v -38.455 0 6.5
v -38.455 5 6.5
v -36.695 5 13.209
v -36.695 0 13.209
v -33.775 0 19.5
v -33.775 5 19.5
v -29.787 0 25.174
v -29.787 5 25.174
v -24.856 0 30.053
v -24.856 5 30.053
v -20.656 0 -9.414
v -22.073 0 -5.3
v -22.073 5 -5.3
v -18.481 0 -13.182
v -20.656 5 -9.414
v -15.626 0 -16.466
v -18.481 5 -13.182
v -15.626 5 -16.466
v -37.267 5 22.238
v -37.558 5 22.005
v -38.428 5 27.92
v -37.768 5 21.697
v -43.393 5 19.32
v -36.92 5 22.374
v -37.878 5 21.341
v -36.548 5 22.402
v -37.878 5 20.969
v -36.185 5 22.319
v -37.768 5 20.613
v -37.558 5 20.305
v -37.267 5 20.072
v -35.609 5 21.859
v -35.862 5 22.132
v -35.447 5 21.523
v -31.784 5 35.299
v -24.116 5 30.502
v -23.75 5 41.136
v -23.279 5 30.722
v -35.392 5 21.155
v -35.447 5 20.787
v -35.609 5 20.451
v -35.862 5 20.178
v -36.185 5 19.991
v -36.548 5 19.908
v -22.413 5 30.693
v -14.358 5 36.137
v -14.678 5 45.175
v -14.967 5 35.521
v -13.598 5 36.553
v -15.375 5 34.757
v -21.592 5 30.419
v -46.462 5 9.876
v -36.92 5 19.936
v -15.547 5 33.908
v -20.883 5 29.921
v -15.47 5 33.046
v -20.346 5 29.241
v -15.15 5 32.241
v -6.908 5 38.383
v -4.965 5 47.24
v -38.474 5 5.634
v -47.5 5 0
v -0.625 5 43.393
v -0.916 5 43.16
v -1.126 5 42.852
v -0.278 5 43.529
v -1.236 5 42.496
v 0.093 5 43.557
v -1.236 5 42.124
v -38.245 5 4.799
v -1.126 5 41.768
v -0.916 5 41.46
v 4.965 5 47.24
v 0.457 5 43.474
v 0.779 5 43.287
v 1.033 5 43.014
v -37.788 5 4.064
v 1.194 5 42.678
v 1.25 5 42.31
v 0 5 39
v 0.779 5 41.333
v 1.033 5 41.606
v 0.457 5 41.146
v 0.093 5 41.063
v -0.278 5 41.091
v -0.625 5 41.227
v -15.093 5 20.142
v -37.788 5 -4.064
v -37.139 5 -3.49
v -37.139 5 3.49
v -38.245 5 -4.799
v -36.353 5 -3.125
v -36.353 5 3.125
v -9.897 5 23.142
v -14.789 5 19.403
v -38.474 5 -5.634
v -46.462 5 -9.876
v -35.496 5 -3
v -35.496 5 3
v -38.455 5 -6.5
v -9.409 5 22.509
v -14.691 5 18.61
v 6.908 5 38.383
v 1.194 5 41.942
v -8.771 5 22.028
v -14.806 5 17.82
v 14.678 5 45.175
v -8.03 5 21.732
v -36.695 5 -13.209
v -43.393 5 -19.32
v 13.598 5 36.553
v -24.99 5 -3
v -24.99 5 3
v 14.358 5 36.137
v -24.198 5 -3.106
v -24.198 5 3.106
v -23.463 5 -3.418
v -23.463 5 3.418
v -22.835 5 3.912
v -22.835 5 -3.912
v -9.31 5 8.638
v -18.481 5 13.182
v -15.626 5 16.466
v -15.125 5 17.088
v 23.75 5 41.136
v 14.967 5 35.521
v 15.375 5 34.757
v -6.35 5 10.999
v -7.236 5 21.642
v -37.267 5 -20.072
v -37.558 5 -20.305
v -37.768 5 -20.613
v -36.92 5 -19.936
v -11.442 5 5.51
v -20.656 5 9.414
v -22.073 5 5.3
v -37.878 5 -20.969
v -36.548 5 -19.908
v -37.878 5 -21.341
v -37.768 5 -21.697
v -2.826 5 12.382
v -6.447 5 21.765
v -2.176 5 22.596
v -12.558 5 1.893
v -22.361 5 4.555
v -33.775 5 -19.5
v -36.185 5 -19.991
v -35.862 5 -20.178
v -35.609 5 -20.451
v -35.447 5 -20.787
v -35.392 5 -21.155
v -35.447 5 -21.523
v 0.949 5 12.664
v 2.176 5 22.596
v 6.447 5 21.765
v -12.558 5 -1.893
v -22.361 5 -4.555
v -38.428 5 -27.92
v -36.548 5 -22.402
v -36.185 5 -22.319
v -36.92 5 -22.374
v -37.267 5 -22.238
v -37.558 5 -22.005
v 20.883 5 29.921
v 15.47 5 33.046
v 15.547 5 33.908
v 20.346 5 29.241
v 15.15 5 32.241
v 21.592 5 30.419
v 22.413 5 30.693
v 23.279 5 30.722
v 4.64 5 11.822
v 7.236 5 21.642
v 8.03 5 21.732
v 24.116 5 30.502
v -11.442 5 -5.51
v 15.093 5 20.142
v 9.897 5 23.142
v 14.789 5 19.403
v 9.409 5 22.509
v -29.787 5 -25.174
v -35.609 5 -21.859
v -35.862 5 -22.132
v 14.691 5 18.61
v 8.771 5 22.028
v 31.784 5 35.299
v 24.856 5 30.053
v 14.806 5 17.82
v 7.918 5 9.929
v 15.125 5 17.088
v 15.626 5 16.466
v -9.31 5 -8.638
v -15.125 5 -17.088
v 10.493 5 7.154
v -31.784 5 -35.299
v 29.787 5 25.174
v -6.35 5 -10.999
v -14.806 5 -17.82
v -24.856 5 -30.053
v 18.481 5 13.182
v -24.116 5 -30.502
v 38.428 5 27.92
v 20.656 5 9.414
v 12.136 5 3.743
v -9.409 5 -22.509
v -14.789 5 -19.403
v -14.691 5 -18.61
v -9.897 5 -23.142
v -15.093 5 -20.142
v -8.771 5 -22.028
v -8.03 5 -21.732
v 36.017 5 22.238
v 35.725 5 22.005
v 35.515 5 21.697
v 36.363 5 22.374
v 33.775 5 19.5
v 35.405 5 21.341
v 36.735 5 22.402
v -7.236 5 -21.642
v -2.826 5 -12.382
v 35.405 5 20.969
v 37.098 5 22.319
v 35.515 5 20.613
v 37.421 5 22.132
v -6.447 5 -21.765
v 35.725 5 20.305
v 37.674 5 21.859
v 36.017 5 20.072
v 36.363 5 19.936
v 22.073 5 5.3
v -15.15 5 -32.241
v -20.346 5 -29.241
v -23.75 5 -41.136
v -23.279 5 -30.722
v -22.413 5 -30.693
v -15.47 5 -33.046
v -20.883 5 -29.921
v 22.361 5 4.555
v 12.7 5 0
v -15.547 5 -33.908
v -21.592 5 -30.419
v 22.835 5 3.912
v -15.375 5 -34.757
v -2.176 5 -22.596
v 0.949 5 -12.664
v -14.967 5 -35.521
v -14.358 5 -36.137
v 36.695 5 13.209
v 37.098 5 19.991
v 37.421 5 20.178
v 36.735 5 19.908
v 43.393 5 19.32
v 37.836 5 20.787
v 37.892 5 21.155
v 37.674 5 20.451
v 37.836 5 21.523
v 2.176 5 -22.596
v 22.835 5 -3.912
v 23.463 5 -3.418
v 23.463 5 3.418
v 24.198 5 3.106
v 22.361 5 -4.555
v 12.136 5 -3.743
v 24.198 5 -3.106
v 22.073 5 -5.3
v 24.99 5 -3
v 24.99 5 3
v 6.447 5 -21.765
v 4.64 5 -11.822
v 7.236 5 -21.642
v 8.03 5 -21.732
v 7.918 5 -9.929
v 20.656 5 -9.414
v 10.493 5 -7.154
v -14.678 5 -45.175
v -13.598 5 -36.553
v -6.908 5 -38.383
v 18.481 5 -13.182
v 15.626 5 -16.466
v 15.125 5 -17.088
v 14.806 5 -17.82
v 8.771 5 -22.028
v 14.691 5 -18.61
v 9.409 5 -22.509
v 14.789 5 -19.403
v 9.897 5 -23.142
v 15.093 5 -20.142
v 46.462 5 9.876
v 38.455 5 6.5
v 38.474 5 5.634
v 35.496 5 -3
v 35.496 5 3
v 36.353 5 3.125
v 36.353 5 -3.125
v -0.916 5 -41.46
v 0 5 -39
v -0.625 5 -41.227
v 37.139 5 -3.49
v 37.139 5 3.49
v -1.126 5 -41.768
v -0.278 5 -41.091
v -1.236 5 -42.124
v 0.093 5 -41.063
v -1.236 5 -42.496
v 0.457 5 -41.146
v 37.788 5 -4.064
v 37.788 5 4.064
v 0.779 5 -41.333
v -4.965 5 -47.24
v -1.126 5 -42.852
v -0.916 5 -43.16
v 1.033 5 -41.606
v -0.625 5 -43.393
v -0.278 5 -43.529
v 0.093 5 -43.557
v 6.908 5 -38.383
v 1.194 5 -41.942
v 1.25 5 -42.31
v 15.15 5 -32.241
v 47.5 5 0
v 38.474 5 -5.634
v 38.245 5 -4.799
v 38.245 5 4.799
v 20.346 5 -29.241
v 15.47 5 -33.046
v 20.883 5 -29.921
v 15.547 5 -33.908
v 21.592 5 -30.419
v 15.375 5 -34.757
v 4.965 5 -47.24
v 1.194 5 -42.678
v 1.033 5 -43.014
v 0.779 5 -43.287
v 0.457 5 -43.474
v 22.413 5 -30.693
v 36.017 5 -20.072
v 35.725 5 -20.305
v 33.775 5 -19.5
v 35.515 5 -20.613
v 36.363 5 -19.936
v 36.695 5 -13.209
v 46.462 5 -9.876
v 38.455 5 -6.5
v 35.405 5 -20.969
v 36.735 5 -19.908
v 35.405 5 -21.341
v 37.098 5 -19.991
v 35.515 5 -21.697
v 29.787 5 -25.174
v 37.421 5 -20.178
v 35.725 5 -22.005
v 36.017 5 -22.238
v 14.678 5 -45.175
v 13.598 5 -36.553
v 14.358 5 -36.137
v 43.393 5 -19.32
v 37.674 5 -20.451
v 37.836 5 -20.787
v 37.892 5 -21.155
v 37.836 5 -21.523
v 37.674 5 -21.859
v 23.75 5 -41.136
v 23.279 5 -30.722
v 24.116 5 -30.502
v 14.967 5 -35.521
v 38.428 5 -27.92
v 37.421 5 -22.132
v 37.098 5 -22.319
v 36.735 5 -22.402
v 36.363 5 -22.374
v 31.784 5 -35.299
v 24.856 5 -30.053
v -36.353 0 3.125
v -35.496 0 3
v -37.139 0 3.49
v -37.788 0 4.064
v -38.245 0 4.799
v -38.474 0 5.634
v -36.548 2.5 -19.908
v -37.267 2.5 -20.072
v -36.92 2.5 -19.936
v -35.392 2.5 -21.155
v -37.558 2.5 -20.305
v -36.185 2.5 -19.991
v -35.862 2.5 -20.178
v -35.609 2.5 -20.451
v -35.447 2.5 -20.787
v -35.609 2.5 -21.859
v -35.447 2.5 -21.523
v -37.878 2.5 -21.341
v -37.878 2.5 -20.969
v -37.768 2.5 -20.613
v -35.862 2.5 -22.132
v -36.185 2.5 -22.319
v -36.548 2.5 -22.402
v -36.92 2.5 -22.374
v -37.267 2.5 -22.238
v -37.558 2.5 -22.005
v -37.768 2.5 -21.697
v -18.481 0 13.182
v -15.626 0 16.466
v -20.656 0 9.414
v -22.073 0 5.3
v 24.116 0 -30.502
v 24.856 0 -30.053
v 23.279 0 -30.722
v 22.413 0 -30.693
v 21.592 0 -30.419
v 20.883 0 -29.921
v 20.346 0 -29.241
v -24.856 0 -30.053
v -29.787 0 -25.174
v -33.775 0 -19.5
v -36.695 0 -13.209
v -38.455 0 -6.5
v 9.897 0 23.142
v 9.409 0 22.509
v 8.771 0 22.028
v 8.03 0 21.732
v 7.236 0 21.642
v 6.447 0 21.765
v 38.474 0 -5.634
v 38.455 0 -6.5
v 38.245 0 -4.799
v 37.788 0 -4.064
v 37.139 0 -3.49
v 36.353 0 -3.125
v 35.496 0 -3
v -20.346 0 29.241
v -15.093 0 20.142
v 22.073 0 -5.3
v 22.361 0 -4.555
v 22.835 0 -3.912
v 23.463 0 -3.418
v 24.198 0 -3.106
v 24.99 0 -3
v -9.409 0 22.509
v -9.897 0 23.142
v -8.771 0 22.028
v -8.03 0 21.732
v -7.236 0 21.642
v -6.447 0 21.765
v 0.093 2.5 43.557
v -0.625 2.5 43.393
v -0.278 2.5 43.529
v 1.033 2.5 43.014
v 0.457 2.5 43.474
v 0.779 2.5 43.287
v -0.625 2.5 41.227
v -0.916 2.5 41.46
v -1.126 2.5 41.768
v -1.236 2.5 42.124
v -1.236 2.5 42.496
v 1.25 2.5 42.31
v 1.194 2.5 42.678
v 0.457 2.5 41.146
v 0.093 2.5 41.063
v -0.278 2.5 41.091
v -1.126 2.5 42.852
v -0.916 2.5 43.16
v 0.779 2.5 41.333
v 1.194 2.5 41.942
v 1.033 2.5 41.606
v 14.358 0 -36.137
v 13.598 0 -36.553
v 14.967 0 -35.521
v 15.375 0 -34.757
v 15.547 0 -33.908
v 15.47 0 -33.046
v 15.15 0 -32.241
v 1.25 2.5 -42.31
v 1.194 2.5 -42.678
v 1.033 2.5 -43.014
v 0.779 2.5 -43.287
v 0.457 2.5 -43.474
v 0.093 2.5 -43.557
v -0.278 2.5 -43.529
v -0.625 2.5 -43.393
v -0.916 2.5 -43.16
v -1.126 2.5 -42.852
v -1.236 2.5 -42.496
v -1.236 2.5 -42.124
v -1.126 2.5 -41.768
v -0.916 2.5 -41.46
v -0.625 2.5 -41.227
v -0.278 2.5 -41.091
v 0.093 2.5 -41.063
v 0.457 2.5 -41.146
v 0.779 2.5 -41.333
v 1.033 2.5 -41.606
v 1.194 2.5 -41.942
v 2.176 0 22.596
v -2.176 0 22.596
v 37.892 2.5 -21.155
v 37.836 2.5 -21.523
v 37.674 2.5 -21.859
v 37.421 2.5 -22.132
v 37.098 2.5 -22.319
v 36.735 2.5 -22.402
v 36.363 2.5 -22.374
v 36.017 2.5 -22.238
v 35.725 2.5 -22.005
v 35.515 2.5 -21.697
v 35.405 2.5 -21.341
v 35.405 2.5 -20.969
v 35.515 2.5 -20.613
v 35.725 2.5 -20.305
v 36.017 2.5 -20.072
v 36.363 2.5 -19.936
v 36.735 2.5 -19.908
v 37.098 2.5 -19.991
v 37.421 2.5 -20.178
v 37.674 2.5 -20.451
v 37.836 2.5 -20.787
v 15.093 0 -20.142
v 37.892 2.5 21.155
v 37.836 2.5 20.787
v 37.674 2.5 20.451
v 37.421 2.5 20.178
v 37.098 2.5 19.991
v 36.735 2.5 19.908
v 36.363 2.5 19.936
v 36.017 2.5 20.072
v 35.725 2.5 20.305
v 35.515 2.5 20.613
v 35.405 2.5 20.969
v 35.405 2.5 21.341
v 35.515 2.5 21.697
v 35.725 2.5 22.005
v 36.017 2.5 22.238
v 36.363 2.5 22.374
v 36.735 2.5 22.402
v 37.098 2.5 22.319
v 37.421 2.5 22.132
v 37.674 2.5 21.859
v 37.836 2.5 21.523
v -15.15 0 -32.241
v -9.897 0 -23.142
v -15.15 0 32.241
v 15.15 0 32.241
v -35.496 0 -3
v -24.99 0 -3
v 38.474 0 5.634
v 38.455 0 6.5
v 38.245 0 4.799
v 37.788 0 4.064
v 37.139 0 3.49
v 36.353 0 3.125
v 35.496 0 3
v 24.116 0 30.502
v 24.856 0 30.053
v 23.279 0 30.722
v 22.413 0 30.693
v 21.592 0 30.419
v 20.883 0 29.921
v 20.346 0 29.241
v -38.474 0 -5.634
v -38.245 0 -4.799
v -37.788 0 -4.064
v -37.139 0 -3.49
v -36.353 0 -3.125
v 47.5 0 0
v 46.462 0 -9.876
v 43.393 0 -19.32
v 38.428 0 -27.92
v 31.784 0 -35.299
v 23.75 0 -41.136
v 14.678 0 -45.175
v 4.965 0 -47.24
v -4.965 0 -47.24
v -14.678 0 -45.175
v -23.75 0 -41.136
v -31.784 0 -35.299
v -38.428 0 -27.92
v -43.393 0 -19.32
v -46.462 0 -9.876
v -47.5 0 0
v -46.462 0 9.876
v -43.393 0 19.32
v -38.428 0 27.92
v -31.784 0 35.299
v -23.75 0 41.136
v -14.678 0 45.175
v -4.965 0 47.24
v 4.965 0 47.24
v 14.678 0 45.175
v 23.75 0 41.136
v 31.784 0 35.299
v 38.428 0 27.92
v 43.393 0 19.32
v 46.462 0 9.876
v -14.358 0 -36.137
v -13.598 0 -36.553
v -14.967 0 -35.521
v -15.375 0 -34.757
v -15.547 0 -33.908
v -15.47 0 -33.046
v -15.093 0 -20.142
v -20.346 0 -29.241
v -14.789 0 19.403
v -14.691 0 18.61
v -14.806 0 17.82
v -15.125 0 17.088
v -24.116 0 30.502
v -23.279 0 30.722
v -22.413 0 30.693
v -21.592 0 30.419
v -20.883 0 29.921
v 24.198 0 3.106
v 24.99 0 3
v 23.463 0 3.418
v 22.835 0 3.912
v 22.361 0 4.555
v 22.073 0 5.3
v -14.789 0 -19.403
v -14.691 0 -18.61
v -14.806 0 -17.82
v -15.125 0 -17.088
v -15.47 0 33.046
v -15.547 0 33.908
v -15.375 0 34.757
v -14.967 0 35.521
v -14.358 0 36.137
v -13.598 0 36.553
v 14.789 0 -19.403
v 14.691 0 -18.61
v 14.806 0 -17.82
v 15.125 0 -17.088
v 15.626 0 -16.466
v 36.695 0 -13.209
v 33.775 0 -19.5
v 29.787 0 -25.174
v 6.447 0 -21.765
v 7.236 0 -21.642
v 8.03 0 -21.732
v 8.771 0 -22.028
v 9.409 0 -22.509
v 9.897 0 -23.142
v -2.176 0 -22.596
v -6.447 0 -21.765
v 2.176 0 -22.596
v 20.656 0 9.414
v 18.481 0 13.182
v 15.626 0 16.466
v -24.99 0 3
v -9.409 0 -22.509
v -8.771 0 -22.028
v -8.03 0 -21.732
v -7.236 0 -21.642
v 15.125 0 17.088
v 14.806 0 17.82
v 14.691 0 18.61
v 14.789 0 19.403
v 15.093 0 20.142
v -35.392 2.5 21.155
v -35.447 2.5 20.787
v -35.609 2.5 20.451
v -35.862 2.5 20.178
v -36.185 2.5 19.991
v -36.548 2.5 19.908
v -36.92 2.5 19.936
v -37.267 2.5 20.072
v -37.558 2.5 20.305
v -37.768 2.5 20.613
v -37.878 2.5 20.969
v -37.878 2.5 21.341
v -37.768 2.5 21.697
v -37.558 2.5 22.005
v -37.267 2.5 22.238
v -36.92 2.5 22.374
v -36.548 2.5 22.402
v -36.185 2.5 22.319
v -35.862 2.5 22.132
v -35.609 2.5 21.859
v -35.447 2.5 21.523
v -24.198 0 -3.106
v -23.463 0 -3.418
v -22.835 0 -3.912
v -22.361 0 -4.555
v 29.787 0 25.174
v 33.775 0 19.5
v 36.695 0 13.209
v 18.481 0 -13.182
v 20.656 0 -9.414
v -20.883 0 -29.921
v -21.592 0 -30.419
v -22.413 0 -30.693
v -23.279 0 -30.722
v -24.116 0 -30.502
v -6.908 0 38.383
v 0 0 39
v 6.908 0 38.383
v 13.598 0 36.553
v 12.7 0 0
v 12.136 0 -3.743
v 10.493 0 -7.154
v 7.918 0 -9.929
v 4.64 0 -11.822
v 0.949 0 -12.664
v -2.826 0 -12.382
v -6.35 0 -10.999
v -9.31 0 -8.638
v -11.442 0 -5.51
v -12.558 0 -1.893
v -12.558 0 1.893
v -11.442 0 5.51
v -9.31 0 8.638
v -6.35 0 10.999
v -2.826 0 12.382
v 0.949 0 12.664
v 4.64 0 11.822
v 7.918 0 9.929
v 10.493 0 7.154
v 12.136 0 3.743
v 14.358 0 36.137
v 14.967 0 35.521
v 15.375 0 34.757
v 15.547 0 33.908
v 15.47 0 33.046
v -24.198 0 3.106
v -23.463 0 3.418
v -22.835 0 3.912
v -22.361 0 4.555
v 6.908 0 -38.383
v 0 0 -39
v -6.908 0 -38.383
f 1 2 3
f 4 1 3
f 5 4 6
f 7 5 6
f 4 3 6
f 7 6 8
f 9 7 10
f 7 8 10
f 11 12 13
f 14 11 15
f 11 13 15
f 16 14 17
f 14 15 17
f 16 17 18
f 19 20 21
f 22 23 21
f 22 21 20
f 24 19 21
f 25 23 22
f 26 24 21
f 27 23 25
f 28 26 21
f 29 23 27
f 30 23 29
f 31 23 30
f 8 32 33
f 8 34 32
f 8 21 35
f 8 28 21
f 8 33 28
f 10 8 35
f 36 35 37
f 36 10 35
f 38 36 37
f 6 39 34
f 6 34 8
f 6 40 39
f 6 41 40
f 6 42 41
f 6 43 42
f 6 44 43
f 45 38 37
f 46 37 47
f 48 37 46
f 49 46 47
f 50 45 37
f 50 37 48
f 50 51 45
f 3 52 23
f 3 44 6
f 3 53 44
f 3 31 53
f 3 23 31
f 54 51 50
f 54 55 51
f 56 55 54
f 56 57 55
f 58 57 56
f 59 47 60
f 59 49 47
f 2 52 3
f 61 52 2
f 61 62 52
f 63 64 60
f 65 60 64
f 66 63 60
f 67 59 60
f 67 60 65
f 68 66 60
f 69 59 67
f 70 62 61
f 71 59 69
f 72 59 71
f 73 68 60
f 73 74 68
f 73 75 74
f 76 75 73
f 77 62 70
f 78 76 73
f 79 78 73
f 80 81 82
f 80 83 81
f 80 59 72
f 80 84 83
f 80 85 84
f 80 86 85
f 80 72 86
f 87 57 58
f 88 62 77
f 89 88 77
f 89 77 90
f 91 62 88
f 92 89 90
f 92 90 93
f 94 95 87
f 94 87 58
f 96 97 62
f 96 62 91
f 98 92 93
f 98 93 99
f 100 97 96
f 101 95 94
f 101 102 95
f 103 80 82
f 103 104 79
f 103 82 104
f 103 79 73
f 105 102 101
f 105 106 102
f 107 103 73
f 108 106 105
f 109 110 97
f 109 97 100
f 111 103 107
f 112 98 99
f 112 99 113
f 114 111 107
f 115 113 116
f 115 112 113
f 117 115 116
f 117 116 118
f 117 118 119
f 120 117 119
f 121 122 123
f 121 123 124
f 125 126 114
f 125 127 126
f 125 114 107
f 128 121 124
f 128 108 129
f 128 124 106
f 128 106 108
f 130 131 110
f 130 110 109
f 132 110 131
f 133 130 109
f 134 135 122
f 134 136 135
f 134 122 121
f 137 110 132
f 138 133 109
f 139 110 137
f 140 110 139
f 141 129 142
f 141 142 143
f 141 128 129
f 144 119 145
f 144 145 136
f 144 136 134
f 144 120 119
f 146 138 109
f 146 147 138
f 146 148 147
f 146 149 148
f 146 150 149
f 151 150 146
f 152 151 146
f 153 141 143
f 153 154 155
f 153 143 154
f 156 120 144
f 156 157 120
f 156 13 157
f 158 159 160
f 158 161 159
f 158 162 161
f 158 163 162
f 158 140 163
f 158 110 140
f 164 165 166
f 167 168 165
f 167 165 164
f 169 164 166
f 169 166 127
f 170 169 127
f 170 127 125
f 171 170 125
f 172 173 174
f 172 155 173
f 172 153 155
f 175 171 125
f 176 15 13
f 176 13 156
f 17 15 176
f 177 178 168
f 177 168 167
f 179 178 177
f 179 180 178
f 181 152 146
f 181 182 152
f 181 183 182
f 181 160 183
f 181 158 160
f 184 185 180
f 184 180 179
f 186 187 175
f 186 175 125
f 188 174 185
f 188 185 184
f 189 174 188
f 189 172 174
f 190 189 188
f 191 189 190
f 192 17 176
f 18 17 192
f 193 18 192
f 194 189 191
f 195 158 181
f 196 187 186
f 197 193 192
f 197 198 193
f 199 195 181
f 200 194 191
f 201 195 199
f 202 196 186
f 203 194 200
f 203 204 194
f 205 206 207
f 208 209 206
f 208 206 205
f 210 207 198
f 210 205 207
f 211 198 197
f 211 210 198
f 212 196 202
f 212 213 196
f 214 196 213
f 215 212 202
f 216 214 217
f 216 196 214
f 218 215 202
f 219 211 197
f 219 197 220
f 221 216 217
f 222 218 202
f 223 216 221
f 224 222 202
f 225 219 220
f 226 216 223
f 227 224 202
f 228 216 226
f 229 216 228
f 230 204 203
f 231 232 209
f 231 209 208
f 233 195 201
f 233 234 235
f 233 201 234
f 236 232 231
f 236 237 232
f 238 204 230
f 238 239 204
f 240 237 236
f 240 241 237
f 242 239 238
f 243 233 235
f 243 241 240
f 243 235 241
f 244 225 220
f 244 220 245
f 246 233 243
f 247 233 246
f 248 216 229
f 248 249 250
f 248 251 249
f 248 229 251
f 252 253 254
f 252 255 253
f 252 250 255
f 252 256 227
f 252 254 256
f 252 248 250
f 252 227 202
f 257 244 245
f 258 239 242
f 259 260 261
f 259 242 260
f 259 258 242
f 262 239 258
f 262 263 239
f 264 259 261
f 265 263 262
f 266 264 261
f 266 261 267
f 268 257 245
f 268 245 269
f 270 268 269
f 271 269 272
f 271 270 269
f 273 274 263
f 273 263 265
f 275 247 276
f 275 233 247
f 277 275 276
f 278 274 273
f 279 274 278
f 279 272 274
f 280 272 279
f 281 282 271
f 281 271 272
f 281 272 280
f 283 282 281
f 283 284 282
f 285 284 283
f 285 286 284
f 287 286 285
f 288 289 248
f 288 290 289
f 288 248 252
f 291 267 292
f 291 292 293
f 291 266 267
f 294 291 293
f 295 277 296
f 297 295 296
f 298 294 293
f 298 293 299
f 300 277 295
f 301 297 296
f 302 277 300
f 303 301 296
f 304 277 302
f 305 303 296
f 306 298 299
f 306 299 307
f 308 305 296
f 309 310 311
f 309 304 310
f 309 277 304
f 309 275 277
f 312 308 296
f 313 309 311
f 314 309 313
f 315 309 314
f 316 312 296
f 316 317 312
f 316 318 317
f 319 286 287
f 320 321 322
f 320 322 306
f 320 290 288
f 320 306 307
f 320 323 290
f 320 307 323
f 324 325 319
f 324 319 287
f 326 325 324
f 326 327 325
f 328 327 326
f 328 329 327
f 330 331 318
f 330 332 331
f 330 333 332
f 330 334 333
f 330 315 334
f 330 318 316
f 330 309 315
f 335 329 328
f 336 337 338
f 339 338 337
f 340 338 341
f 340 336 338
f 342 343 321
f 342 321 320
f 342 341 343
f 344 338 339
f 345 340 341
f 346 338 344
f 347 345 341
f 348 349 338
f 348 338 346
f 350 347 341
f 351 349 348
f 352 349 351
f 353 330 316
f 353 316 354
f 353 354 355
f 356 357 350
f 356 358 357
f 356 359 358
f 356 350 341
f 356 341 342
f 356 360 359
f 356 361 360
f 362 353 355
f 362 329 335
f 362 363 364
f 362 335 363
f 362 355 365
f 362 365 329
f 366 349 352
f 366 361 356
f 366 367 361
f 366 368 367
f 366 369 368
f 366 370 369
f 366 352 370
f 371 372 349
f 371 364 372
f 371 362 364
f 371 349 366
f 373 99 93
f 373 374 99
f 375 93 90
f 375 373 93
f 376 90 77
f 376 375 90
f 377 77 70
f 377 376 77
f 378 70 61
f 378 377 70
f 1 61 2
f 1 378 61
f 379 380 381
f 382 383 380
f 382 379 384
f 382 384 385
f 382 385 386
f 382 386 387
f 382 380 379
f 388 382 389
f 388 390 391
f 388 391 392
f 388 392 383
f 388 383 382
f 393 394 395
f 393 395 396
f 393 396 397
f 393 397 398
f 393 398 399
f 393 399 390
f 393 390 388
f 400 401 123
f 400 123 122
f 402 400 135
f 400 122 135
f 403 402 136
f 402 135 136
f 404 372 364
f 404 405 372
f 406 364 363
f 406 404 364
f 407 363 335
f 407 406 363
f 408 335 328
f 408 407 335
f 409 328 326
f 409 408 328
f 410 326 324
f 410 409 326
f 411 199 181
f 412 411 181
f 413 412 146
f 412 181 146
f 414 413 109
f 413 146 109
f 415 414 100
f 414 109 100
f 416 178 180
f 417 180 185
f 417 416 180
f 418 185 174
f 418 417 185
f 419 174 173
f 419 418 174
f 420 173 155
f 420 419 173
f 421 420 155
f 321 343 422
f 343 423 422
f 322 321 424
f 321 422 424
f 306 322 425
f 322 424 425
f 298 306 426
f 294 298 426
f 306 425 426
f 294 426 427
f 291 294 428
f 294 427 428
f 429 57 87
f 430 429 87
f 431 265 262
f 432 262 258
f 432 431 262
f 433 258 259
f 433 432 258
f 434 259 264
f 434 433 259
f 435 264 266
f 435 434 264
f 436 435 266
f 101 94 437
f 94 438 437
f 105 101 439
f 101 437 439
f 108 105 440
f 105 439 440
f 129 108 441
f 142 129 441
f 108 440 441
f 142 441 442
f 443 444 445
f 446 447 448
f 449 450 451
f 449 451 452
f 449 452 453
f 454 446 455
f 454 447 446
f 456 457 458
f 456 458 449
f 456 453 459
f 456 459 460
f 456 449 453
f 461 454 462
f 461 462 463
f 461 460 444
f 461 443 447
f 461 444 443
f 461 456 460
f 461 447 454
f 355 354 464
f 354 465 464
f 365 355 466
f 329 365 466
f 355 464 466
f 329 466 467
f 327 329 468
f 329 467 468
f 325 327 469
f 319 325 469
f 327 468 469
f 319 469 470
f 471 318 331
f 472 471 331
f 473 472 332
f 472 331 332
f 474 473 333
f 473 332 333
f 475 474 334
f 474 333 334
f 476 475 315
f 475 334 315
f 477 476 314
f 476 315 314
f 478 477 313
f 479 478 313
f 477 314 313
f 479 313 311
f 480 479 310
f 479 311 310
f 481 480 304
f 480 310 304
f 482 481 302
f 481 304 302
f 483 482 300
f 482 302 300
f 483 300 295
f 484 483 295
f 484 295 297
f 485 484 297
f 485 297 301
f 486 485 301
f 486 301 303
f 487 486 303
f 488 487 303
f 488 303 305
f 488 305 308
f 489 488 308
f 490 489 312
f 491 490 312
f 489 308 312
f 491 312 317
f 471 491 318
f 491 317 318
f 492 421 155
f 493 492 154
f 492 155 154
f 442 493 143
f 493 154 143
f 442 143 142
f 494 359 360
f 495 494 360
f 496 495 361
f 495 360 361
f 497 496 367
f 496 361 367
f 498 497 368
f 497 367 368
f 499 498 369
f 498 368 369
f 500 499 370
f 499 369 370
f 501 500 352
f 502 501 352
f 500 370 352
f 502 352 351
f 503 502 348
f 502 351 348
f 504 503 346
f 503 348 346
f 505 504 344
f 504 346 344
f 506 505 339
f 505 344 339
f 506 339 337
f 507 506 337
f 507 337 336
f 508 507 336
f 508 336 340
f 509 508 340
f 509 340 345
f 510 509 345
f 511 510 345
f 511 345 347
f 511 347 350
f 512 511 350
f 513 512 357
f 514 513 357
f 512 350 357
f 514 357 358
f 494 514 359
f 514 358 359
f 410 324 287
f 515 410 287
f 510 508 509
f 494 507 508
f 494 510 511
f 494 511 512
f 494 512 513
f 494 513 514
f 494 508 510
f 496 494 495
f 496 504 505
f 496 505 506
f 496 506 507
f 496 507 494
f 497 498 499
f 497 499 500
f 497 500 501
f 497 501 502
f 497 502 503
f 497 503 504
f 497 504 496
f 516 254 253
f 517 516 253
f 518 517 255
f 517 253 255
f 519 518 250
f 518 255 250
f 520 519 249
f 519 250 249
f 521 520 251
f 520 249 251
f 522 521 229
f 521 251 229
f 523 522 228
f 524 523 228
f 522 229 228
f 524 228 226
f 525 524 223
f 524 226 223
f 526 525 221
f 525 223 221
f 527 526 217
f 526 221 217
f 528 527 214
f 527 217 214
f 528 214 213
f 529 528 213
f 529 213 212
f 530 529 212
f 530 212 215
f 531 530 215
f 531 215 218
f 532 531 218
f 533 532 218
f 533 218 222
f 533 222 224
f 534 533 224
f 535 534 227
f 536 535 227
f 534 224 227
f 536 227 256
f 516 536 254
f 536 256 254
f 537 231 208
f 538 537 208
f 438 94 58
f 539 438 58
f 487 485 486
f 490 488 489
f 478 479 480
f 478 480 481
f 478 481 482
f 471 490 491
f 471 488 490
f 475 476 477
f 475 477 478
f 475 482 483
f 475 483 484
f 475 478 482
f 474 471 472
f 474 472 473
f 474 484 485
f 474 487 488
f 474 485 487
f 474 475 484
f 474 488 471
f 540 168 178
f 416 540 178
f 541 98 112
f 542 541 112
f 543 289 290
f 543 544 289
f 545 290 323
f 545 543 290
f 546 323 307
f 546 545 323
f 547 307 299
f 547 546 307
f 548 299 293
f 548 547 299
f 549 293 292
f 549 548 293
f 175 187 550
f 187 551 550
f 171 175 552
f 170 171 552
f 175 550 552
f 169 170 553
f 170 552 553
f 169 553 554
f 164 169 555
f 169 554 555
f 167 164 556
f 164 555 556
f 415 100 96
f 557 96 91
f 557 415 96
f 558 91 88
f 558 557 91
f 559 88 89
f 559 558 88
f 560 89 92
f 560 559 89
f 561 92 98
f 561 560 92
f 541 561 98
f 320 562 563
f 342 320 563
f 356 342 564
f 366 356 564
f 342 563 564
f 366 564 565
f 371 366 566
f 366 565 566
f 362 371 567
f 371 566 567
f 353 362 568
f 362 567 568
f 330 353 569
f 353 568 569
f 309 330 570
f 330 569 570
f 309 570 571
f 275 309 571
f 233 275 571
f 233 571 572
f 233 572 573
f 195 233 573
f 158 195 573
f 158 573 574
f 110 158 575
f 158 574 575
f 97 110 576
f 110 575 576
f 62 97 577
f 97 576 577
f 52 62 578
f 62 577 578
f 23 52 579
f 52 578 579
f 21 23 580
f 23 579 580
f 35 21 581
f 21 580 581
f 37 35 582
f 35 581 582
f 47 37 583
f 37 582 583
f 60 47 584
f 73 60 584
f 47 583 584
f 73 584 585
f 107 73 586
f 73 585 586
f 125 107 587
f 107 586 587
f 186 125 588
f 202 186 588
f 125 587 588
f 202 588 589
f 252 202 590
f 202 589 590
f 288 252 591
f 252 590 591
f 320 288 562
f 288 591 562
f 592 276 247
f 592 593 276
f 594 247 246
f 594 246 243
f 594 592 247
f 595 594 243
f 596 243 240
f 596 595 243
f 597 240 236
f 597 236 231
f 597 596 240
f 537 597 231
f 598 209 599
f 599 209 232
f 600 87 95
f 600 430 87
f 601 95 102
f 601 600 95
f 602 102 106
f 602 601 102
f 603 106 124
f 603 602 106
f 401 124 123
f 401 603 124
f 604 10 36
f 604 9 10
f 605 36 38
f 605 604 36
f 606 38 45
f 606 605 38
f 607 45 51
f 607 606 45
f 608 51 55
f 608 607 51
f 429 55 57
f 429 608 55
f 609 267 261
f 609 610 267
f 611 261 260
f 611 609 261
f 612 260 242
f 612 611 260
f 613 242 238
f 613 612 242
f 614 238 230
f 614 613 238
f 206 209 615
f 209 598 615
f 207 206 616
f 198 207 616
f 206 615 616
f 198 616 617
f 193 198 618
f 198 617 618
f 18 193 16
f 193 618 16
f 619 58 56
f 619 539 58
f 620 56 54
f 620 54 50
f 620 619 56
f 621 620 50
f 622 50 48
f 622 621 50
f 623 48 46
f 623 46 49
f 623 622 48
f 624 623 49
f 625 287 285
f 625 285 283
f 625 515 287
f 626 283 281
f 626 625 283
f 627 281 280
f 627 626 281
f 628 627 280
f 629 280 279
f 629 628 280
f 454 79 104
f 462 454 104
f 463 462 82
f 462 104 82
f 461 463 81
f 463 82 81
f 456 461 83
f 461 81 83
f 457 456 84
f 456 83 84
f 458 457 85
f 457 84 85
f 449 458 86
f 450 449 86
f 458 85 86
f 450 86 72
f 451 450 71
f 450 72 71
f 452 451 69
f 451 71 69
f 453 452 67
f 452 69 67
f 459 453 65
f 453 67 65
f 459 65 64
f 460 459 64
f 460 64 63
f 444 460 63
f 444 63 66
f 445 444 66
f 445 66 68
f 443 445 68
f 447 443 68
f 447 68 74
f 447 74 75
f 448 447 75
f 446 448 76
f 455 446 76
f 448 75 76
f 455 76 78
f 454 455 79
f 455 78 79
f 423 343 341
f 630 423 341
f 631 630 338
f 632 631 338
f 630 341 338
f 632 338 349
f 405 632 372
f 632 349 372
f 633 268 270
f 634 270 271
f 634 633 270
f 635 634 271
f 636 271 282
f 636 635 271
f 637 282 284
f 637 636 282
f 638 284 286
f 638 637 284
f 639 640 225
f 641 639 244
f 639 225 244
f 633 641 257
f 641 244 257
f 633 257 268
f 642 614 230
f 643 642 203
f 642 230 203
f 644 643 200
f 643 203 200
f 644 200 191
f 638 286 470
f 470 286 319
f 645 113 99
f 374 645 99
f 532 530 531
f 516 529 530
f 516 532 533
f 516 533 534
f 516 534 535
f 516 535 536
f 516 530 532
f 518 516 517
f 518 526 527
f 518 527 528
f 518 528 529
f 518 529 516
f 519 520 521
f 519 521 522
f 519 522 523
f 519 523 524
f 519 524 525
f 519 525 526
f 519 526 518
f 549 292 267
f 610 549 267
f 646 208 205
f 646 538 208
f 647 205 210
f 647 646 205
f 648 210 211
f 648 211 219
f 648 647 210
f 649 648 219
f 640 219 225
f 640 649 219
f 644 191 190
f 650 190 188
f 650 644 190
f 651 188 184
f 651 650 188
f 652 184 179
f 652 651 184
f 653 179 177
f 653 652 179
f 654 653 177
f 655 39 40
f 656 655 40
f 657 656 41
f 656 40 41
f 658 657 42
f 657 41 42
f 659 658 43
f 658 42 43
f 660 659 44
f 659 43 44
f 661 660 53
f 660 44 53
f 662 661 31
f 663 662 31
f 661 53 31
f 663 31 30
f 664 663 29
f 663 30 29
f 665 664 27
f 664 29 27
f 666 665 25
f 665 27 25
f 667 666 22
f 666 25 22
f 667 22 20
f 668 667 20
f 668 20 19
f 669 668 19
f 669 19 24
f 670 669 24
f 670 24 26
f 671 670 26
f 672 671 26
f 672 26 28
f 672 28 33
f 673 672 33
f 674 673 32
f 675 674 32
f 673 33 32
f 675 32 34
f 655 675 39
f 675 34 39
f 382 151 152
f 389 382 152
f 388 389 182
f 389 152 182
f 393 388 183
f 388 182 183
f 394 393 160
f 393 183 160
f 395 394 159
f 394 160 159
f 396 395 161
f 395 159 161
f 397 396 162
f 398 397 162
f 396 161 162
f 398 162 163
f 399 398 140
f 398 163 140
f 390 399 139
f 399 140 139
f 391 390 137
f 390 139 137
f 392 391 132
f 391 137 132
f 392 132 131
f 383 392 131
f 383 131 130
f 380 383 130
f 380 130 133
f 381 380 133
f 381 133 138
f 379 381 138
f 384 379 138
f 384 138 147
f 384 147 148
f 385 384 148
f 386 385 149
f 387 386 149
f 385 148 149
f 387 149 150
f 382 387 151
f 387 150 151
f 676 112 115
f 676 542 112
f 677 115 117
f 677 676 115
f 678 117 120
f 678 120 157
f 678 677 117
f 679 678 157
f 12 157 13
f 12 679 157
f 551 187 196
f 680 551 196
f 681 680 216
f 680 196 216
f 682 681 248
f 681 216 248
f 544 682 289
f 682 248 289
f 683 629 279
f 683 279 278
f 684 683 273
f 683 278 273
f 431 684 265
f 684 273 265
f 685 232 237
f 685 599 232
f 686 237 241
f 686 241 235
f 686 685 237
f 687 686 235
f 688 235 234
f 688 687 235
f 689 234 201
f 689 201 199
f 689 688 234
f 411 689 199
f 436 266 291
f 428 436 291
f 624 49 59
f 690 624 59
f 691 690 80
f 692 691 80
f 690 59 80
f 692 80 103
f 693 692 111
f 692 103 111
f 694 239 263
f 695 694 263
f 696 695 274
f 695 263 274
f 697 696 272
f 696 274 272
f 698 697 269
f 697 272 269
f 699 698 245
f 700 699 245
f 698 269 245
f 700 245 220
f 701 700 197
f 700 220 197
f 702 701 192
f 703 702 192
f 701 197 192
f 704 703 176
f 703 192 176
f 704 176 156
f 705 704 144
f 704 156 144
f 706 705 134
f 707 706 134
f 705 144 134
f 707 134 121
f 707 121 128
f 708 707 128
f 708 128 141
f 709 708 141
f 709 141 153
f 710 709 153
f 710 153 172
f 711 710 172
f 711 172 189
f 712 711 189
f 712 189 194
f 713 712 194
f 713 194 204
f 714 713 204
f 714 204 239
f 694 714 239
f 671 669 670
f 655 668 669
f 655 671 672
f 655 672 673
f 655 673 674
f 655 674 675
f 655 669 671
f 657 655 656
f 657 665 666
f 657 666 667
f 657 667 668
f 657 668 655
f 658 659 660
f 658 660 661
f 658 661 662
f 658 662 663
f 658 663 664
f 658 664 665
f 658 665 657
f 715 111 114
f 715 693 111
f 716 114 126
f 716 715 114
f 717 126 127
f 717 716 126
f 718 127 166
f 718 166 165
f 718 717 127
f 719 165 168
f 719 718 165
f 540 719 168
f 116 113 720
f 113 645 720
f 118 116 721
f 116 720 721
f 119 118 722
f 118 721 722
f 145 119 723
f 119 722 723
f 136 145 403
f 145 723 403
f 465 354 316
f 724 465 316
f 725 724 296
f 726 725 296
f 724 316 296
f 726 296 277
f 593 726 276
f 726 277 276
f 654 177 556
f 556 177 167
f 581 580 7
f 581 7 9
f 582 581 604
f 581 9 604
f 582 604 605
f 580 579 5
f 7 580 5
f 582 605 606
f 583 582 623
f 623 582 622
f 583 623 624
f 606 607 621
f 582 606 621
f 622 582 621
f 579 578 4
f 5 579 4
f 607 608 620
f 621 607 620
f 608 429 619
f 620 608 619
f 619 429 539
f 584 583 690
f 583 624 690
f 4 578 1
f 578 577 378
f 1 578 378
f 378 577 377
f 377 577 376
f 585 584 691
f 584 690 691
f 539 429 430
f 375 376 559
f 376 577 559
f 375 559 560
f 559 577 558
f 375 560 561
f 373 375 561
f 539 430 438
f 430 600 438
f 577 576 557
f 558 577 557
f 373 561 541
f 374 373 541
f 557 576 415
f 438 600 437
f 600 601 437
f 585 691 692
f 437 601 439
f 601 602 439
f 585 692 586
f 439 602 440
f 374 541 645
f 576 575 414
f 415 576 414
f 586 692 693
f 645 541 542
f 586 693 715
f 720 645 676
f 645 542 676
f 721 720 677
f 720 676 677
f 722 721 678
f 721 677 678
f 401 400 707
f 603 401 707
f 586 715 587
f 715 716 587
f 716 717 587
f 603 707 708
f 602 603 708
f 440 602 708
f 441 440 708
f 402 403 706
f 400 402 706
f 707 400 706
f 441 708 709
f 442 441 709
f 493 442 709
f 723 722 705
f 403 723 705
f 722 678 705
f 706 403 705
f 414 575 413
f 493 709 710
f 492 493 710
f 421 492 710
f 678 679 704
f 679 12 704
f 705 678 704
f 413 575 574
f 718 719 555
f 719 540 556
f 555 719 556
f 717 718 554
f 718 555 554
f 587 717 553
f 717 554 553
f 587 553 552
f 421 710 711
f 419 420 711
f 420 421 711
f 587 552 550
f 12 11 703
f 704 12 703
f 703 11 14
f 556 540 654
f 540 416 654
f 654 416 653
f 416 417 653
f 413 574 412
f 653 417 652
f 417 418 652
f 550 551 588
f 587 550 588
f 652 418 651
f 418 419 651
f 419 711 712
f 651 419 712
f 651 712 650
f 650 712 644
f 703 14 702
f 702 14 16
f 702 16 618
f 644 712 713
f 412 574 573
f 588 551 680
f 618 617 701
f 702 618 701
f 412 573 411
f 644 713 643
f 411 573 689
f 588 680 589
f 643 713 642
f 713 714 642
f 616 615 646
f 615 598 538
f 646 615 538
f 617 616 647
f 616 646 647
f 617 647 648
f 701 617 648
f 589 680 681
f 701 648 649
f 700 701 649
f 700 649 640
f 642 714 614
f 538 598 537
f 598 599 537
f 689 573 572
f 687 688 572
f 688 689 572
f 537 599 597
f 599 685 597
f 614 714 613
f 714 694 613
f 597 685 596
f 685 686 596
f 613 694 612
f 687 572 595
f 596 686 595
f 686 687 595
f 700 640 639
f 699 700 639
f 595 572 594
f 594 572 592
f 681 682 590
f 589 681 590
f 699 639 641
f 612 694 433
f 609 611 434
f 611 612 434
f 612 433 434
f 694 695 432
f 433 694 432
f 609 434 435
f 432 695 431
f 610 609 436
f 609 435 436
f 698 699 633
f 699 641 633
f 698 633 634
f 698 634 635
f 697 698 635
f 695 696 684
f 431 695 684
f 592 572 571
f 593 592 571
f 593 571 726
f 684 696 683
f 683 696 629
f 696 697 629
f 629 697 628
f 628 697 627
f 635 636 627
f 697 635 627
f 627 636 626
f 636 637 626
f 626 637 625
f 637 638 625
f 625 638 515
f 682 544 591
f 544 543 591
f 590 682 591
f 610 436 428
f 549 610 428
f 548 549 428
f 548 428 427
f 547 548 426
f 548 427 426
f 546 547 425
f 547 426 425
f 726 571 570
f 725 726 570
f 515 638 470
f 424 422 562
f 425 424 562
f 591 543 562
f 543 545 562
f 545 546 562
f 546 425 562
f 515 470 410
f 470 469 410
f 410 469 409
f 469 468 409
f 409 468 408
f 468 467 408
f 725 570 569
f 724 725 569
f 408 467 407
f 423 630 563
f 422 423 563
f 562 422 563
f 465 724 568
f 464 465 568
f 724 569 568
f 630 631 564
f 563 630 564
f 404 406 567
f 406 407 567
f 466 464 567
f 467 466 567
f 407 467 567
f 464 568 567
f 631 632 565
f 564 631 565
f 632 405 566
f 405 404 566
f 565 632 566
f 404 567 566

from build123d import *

# Parameters (mm, degrees)
SKETCH1_R           = 47.5
BOSS_EXTRUDE1_DEPTH = 5
SKETCH2_R           = 12.7
CUT_EXTRUDE1_DEPTH  = 6
SKETCH3_R           = 1.25
CUT_EXTRUDE2_DEPTH  = 2.5
CUT_EXTRUDE3_DEPTH  = 6
FILLET1_R           = 3


with BuildPart() as part:
    # Sketch1 → Boss-Extrude1 (new body)
    with BuildSketch(Plane(origin=(0, 0, 0), x_dir=(1, 0, 0), z_dir=(0, 1, 0))):
        Circle(SKETCH1_R)
    extrude(amount=BOSS_EXTRUDE1_DEPTH)

    # Sketch2 → Cut-Extrude1 (cut, through all)
    with BuildSketch(Plane(origin=(0, 5, 0), x_dir=(1, 0, 0), z_dir=(0, 1, 0))):
        Circle(SKETCH2_R)
    extrude(amount=-CUT_EXTRUDE1_DEPTH, mode=Mode.SUBTRACT)

    # Sketch3 → Cut-Extrude2 (cut)
    with BuildSketch(Plane(origin=(0, 5, 0), x_dir=(1, 0, 0), z_dir=(0, 1, 0))):
        with Locations((0, 42.31)):
            Circle(SKETCH3_R)
        with Locations((36.641534834, 21.155)):
            Circle(SKETCH3_R)
        with Locations((36.641534834, -21.155)):
            Circle(SKETCH3_R)
        with Locations((0, -42.31)):
            Circle(SKETCH3_R)
        with Locations((-36.641534834, -21.155)):
            Circle(SKETCH3_R)
        with Locations((-36.641534834, 21.155)):
            Circle(SKETCH3_R)
    extrude(amount=-CUT_EXTRUDE2_DEPTH, mode=Mode.SUBTRACT)

    # Sketch4 → Cut-Extrude3 (cut, through all)
    with BuildSketch(Plane(origin=(0, 5, 0), x_dir=(1, 0, 0), z_dir=(0, 1, 0))):
        with BuildLine():
            Line((-13.848520647, 17.98634137), (-22.040298307, 32.174916481))
            ThreePointArc((-22.040298307, 32.174916481), (-33.774990748, 19.5), (-38.88444419, 3))
            Line((-38.88444419, 3), (-22.500888871, 3))
            ThreePointArc((-22.500888871, 3), (-19.658776666, 11.35), (-13.848520647, 17.98634137))
        make_face()
        with BuildLine():
            ThreePointArc((16.844145884, 35.174916481), (0, 39), (-16.844145884, 35.174916481))
            Line((-16.844145884, 35.174916481), (-8.652368224, 20.98634137))
            ThreePointArc((-8.652368224, 20.98634137), (0, 22.7), (8.652368224, 20.98634137))
            Line((8.652368224, 20.98634137), (16.844145884, 35.174916481))
        make_face()
        with BuildLine():
            ThreePointArc((38.88444419, 3), (33.774990748, 19.5), (22.040298307, 32.174916481))
            Line((22.040298307, 32.174916481), (13.848520647, 17.98634137))
            ThreePointArc((13.848520647, 17.98634137), (19.658776666, 11.35), (22.500888871, 3))
            Line((22.500888871, 3), (38.88444419, 3))
        make_face()
        with BuildLine():
            ThreePointArc((22.040298307, -32.174916481), (33.774990748, -19.5), (38.88444419, -3))
            Line((38.88444419, -3), (22.500888871, -3))
            ThreePointArc((22.500888871, -3), (19.658776666, -11.35), (13.848520647, -17.98634137))
            Line((13.848520647, -17.98634137), (22.040298307, -32.174916481))
        make_face()
        with BuildLine():
            Line((-8.652368224, -20.98634137), (-16.844145884, -35.174916481))
            ThreePointArc((-16.844145884, -35.174916481), (0, -39), (16.844145884, -35.174916481))
            Line((16.844145884, -35.174916481), (8.652368224, -20.98634137))
            ThreePointArc((8.652368224, -20.98634137), (0, -22.7), (-8.652368224, -20.98634137))
        make_face()
        with BuildLine():
            Line((-22.500888871, -3), (-38.88444419, -3))
            ThreePointArc((-38.88444419, -3), (-33.774990748, -19.5), (-22.040298307, -32.174916481))
            Line((-22.040298307, -32.174916481), (-13.848520647, -17.98634137))
            ThreePointArc((-13.848520647, -17.98634137), (-19.658776666, -11.35), (-22.500888871, -3))
        make_face()
    extrude(amount=-CUT_EXTRUDE3_DEPTH, mode=Mode.SUBTRACT)

    # Fillet1
    fillet1_edges = [part.edges().sort_by_distance(p)[0] for p in [
        (22.500888871, 2.5, -3),
        (13.848520647, 2.5, -17.98634137),
        (22.040298307, 2.5, -32.174916481),
        (38.88444419, 2.5, -3),
        (8.652368224, 2.5, -20.98634137),
        (-8.652368224, 2.5, -20.98634137),
        (-16.844145884, 2.5, -35.174916481),
        (16.844145884, 2.5, -35.174916481),
        (-8.652368224, 2.5, 20.98634137),
        (8.652368224, 2.5, 20.98634137),
        (16.844145884, 2.5, 35.174916481),
        (-16.844145884, 2.5, 35.174916481),
        (13.848520647, 2.5, 17.98634137),
        (22.500888871, 2.5, 3),
        (38.88444419, 2.5, 3),
        (22.040298307, 2.5, 32.174916481),
        (-22.500888871, 2.5, 3),
        (-13.848520647, 2.5, 17.98634137),
        (-22.040298307, 2.5, 32.174916481),
        (-38.88444419, 2.5, 3),
        (-13.848520647, 2.5, -17.98634137),
        (-22.500888871, 2.5, -3),
        (-38.88444419, 2.5, -3),
        (-22.040298307, 2.5, -32.174916481),
    ]]
    fillet(fillet1_edges, radius=FILLET1_R)


solid = part.part
